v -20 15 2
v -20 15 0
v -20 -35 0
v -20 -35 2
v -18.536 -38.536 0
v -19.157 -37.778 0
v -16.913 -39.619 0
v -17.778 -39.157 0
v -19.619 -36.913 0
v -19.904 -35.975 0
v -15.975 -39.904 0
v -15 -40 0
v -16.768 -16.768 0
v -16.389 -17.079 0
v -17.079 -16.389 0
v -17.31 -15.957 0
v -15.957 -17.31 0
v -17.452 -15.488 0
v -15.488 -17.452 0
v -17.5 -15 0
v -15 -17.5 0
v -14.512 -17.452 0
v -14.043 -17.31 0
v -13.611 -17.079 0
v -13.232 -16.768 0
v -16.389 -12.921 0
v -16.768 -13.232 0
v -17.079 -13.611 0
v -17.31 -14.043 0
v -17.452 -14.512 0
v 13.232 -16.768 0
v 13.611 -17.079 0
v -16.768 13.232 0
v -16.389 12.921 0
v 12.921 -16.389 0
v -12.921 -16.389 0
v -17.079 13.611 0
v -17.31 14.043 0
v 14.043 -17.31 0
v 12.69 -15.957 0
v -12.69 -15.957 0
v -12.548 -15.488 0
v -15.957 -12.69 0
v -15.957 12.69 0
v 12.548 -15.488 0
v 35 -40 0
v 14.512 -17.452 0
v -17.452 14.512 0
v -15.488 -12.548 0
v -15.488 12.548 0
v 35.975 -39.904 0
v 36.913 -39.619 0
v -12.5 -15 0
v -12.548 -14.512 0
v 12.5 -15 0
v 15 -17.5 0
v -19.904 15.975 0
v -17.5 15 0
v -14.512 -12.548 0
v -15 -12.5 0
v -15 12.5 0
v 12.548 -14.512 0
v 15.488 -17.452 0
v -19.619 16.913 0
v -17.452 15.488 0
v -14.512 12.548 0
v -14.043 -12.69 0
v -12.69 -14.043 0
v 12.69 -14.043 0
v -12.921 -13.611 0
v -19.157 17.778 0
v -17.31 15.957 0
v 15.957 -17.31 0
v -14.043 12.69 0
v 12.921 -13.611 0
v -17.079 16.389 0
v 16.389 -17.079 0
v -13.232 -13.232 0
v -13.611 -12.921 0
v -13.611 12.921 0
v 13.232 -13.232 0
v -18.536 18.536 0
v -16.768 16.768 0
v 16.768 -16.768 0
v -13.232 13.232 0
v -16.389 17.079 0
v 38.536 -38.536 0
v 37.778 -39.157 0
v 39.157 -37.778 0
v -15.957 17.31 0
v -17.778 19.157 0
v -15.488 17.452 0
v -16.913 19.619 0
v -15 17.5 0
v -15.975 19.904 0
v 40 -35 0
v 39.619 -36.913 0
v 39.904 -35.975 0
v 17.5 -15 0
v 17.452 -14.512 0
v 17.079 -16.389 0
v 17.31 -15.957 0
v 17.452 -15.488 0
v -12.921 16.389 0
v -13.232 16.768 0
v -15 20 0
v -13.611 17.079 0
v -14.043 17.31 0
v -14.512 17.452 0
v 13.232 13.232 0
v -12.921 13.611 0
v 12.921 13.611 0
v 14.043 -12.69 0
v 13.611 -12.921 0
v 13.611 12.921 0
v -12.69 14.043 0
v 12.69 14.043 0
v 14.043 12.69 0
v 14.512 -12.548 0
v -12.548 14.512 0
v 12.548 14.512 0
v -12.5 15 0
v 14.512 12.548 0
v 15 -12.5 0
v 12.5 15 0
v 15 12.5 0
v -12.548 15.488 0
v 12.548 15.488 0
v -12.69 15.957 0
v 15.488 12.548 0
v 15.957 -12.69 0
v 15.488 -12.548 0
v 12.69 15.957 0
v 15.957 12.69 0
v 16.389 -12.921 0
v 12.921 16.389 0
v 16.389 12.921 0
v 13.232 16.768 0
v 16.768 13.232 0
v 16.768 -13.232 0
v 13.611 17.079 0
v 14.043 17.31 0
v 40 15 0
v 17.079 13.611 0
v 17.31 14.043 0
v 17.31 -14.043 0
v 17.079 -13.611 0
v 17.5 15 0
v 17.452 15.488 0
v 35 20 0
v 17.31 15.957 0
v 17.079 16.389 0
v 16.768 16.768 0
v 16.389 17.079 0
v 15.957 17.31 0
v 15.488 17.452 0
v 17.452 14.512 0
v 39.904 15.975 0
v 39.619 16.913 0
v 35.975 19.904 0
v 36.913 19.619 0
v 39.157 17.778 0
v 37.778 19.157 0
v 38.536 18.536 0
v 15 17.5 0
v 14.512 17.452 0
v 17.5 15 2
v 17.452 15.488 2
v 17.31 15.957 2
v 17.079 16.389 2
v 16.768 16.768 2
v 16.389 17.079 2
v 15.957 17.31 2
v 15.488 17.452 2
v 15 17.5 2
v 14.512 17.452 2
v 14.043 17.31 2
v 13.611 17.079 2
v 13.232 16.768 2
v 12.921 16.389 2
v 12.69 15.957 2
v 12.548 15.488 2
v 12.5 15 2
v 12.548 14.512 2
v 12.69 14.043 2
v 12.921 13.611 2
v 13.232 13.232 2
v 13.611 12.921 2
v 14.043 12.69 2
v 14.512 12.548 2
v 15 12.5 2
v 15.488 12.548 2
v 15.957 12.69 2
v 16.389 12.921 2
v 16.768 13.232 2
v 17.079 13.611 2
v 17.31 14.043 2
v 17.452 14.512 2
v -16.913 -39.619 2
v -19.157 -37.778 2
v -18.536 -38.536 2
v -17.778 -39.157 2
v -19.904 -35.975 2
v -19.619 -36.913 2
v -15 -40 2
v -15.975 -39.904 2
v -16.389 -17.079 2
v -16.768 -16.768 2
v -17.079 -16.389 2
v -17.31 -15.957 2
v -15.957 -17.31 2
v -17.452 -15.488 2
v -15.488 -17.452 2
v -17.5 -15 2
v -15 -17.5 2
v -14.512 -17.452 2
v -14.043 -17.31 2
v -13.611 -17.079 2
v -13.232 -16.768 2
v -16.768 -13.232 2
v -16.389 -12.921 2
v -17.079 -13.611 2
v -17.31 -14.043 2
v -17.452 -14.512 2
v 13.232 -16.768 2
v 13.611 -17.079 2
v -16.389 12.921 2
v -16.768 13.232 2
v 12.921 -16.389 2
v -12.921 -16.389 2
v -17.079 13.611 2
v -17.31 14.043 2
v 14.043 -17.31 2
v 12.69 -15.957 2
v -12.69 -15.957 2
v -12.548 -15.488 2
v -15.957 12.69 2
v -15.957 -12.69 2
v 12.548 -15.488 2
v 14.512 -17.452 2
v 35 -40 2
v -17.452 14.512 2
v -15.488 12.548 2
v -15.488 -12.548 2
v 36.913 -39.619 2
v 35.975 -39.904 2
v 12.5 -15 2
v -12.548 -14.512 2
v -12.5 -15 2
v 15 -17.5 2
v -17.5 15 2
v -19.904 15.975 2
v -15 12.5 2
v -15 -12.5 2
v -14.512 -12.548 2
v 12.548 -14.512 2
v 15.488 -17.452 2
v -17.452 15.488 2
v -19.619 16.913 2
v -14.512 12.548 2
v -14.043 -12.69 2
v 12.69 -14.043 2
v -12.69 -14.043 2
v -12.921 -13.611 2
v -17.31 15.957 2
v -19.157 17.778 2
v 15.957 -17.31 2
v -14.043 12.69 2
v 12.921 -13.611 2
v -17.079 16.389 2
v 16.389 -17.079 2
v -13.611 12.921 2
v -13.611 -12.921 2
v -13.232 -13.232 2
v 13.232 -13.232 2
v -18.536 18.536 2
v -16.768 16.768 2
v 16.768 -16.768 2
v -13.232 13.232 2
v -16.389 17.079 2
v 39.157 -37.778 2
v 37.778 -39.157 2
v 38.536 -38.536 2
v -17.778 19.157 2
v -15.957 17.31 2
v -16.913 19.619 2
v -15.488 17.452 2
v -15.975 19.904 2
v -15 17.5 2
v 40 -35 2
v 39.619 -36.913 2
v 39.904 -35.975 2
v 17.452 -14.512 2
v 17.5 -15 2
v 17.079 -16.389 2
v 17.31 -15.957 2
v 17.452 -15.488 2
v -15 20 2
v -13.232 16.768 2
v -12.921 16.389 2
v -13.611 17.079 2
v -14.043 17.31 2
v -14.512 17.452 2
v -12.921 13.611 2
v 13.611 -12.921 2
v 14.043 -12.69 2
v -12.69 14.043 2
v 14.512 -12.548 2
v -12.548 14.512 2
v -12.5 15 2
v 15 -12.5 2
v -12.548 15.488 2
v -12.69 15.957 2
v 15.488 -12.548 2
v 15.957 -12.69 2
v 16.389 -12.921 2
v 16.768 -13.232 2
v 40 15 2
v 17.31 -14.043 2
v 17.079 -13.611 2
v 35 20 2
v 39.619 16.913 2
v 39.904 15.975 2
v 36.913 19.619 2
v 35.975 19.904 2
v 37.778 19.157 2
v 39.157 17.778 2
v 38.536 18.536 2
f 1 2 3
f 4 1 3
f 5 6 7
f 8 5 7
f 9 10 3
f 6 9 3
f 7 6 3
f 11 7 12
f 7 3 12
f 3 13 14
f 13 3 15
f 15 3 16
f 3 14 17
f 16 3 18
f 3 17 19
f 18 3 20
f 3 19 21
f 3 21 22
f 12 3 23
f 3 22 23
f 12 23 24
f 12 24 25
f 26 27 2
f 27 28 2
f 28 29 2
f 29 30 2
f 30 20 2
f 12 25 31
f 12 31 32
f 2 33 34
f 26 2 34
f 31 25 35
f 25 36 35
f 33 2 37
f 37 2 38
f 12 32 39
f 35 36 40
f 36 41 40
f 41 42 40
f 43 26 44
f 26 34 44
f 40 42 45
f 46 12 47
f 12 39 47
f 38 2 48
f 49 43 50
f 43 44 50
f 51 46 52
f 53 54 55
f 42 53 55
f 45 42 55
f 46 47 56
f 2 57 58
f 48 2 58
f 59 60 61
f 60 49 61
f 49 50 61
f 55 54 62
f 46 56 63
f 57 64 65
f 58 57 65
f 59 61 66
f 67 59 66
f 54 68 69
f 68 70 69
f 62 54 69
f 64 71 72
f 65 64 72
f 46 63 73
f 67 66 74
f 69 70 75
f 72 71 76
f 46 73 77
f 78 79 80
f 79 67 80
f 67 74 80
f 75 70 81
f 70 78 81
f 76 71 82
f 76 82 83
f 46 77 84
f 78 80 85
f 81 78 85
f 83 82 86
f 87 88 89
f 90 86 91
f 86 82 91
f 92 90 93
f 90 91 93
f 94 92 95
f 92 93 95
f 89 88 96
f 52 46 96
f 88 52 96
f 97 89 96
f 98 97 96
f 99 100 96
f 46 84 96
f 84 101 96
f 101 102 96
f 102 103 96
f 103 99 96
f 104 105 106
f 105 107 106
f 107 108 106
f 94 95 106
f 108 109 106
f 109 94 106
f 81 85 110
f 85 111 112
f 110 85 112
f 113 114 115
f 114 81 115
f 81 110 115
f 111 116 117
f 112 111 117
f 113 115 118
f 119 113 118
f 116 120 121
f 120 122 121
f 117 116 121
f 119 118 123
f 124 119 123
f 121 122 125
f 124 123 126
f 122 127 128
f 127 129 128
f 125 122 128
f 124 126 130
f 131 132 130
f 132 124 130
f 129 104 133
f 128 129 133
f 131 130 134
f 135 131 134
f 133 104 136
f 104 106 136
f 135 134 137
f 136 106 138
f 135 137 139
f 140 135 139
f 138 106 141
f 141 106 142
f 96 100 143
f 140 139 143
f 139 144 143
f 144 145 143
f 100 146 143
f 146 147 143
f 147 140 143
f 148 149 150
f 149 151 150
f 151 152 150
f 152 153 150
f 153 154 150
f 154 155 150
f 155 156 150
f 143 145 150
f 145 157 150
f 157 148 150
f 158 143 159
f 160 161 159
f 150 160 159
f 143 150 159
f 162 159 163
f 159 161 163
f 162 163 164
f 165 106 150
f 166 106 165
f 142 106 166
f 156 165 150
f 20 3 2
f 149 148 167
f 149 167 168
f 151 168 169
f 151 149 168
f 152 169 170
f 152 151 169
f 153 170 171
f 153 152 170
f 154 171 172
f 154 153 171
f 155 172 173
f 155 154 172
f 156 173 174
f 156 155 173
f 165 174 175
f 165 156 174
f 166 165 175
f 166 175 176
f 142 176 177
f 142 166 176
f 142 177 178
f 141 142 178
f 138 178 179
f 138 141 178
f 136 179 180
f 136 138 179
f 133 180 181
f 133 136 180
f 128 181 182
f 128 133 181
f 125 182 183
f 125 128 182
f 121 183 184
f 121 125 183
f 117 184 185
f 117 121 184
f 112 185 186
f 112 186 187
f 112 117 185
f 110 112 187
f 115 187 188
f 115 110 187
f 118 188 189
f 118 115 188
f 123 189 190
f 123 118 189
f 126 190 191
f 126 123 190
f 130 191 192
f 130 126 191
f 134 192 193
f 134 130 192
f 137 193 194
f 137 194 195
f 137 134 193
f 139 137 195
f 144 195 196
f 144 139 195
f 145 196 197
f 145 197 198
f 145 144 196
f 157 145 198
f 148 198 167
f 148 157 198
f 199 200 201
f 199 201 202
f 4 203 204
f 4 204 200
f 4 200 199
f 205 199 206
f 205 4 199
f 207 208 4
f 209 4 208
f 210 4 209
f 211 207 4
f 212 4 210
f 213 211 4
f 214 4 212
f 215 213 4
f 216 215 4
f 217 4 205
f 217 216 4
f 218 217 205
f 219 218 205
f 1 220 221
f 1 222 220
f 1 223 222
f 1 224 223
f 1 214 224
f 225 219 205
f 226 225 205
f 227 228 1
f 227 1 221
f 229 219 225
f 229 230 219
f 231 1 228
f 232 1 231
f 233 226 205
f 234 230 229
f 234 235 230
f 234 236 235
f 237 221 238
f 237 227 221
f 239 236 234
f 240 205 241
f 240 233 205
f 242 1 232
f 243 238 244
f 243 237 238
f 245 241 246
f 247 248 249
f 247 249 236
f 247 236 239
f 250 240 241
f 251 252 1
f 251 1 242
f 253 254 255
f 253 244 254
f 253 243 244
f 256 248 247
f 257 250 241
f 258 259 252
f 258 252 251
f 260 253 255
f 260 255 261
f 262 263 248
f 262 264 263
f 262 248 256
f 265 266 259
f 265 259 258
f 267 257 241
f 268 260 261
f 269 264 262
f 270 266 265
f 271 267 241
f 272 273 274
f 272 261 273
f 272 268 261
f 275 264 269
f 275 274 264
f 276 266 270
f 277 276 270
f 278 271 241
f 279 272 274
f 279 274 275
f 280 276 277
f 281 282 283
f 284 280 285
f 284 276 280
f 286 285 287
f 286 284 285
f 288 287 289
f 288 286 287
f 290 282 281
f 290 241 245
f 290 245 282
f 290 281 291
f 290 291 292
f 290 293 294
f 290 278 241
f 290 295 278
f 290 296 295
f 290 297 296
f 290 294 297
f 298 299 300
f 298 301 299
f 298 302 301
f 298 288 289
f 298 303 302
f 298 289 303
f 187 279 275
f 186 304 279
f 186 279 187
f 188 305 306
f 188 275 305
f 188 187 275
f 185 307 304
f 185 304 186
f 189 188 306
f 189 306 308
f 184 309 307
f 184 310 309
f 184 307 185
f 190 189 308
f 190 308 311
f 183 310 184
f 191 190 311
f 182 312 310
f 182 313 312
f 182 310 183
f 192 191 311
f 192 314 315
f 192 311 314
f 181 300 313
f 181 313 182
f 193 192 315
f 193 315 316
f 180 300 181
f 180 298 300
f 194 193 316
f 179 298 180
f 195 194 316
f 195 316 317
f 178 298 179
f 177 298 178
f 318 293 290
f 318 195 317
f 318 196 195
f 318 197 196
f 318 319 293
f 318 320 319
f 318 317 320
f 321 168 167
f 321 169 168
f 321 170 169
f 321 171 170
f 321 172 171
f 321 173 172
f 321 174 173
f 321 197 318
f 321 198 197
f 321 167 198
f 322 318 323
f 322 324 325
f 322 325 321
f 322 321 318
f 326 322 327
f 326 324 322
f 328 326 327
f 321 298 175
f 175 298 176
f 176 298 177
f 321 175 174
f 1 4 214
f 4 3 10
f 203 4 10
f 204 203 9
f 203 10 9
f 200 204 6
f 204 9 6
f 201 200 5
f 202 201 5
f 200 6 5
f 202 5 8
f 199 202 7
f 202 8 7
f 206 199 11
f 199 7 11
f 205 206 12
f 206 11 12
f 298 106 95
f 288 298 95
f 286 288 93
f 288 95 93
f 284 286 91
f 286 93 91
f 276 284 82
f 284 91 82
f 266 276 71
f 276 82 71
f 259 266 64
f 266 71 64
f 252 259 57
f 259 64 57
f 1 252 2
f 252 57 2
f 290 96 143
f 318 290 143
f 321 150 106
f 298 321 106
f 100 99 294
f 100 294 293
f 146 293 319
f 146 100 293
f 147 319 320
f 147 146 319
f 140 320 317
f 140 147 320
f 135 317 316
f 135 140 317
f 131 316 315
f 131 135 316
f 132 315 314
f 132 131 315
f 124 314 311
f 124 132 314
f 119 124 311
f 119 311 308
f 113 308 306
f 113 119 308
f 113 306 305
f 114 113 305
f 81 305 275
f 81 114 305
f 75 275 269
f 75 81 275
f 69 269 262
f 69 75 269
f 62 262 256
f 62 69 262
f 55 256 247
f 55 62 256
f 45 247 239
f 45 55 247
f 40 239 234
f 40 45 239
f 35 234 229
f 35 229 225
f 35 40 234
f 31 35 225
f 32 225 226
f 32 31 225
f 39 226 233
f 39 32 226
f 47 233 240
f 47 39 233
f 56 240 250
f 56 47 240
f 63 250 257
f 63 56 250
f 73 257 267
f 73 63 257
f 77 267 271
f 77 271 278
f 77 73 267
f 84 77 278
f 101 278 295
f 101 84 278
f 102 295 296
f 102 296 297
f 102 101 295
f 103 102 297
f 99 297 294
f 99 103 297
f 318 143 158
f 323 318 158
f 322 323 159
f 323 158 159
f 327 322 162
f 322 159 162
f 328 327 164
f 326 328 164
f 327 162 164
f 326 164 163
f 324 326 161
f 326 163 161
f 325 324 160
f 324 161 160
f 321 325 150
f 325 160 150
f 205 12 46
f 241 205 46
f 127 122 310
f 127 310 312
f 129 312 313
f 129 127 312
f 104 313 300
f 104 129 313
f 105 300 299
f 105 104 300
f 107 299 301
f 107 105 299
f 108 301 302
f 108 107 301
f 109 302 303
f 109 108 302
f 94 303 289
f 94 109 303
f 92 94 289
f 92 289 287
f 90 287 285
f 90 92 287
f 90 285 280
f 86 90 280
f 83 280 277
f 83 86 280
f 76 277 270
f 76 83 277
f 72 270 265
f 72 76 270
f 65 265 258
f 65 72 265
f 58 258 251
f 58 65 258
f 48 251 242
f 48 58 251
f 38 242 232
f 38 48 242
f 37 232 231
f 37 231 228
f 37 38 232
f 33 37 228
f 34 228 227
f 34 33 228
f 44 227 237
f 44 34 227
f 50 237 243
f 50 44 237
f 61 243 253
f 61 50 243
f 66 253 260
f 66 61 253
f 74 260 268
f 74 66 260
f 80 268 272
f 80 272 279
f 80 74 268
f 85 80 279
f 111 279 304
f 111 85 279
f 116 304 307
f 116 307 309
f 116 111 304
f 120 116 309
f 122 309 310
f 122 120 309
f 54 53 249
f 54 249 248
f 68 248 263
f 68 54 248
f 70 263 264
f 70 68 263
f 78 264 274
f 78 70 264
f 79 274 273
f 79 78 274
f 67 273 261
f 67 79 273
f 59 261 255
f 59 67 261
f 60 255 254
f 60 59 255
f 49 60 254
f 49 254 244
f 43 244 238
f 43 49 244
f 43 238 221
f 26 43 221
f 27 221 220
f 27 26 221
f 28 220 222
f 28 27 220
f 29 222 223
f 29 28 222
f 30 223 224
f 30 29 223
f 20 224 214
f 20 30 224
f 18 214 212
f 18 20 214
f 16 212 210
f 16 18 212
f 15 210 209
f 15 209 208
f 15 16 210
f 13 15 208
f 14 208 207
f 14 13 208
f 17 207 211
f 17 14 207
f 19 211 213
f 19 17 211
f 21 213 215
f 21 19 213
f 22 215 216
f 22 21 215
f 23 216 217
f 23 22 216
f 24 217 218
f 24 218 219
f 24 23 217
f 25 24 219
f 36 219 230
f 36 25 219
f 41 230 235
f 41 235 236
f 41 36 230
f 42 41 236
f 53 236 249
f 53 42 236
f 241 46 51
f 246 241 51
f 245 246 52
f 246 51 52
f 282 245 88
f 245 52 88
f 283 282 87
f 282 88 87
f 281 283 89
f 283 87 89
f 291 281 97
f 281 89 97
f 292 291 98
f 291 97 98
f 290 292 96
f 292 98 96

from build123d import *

# Parameters (mm, degrees)
F0_R     = 2.5
F1_DEPTH = 2


# Not quite as in the source:
# - a feature names something its author has since deleted; it is built from what else it names


with BuildPart() as f1:
    # F0 (on Top) → F1 (new body)
    with BuildSketch(Plane.XY):
        with BuildLine():
            ThreePointArc((40, 15), (38.5355339059, 18.5355339059), (35, 20))
            Line((35, 20), (-15, 20))
            ThreePointArc((-15, 20), (-18.5355339059, 18.5355339059), (-20, 15))
            Line((-20, 15), (-20, -35))
            ThreePointArc((-20, -35), (-18.5355339059, -38.5355339059), (-15, -40))
            Line((-15, -40), (35, -40))
            ThreePointArc((35, -40), (38.5355339059, -38.5355339059), (40, -35))
            Line((40, -35), (40, 15))
        make_face()
        with Locations((-15, -15)):
            Circle(F0_R, mode=Mode.SUBTRACT)
        with Locations((15, -15)):
            Circle(F0_R, mode=Mode.SUBTRACT)
        with Locations((-15, 15)):
            Circle(F0_R, mode=Mode.SUBTRACT)
        with Locations((15, 15)):
            Circle(F0_R, mode=Mode.SUBTRACT)
    extrude(amount=F1_DEPTH)


solid = f1.part
